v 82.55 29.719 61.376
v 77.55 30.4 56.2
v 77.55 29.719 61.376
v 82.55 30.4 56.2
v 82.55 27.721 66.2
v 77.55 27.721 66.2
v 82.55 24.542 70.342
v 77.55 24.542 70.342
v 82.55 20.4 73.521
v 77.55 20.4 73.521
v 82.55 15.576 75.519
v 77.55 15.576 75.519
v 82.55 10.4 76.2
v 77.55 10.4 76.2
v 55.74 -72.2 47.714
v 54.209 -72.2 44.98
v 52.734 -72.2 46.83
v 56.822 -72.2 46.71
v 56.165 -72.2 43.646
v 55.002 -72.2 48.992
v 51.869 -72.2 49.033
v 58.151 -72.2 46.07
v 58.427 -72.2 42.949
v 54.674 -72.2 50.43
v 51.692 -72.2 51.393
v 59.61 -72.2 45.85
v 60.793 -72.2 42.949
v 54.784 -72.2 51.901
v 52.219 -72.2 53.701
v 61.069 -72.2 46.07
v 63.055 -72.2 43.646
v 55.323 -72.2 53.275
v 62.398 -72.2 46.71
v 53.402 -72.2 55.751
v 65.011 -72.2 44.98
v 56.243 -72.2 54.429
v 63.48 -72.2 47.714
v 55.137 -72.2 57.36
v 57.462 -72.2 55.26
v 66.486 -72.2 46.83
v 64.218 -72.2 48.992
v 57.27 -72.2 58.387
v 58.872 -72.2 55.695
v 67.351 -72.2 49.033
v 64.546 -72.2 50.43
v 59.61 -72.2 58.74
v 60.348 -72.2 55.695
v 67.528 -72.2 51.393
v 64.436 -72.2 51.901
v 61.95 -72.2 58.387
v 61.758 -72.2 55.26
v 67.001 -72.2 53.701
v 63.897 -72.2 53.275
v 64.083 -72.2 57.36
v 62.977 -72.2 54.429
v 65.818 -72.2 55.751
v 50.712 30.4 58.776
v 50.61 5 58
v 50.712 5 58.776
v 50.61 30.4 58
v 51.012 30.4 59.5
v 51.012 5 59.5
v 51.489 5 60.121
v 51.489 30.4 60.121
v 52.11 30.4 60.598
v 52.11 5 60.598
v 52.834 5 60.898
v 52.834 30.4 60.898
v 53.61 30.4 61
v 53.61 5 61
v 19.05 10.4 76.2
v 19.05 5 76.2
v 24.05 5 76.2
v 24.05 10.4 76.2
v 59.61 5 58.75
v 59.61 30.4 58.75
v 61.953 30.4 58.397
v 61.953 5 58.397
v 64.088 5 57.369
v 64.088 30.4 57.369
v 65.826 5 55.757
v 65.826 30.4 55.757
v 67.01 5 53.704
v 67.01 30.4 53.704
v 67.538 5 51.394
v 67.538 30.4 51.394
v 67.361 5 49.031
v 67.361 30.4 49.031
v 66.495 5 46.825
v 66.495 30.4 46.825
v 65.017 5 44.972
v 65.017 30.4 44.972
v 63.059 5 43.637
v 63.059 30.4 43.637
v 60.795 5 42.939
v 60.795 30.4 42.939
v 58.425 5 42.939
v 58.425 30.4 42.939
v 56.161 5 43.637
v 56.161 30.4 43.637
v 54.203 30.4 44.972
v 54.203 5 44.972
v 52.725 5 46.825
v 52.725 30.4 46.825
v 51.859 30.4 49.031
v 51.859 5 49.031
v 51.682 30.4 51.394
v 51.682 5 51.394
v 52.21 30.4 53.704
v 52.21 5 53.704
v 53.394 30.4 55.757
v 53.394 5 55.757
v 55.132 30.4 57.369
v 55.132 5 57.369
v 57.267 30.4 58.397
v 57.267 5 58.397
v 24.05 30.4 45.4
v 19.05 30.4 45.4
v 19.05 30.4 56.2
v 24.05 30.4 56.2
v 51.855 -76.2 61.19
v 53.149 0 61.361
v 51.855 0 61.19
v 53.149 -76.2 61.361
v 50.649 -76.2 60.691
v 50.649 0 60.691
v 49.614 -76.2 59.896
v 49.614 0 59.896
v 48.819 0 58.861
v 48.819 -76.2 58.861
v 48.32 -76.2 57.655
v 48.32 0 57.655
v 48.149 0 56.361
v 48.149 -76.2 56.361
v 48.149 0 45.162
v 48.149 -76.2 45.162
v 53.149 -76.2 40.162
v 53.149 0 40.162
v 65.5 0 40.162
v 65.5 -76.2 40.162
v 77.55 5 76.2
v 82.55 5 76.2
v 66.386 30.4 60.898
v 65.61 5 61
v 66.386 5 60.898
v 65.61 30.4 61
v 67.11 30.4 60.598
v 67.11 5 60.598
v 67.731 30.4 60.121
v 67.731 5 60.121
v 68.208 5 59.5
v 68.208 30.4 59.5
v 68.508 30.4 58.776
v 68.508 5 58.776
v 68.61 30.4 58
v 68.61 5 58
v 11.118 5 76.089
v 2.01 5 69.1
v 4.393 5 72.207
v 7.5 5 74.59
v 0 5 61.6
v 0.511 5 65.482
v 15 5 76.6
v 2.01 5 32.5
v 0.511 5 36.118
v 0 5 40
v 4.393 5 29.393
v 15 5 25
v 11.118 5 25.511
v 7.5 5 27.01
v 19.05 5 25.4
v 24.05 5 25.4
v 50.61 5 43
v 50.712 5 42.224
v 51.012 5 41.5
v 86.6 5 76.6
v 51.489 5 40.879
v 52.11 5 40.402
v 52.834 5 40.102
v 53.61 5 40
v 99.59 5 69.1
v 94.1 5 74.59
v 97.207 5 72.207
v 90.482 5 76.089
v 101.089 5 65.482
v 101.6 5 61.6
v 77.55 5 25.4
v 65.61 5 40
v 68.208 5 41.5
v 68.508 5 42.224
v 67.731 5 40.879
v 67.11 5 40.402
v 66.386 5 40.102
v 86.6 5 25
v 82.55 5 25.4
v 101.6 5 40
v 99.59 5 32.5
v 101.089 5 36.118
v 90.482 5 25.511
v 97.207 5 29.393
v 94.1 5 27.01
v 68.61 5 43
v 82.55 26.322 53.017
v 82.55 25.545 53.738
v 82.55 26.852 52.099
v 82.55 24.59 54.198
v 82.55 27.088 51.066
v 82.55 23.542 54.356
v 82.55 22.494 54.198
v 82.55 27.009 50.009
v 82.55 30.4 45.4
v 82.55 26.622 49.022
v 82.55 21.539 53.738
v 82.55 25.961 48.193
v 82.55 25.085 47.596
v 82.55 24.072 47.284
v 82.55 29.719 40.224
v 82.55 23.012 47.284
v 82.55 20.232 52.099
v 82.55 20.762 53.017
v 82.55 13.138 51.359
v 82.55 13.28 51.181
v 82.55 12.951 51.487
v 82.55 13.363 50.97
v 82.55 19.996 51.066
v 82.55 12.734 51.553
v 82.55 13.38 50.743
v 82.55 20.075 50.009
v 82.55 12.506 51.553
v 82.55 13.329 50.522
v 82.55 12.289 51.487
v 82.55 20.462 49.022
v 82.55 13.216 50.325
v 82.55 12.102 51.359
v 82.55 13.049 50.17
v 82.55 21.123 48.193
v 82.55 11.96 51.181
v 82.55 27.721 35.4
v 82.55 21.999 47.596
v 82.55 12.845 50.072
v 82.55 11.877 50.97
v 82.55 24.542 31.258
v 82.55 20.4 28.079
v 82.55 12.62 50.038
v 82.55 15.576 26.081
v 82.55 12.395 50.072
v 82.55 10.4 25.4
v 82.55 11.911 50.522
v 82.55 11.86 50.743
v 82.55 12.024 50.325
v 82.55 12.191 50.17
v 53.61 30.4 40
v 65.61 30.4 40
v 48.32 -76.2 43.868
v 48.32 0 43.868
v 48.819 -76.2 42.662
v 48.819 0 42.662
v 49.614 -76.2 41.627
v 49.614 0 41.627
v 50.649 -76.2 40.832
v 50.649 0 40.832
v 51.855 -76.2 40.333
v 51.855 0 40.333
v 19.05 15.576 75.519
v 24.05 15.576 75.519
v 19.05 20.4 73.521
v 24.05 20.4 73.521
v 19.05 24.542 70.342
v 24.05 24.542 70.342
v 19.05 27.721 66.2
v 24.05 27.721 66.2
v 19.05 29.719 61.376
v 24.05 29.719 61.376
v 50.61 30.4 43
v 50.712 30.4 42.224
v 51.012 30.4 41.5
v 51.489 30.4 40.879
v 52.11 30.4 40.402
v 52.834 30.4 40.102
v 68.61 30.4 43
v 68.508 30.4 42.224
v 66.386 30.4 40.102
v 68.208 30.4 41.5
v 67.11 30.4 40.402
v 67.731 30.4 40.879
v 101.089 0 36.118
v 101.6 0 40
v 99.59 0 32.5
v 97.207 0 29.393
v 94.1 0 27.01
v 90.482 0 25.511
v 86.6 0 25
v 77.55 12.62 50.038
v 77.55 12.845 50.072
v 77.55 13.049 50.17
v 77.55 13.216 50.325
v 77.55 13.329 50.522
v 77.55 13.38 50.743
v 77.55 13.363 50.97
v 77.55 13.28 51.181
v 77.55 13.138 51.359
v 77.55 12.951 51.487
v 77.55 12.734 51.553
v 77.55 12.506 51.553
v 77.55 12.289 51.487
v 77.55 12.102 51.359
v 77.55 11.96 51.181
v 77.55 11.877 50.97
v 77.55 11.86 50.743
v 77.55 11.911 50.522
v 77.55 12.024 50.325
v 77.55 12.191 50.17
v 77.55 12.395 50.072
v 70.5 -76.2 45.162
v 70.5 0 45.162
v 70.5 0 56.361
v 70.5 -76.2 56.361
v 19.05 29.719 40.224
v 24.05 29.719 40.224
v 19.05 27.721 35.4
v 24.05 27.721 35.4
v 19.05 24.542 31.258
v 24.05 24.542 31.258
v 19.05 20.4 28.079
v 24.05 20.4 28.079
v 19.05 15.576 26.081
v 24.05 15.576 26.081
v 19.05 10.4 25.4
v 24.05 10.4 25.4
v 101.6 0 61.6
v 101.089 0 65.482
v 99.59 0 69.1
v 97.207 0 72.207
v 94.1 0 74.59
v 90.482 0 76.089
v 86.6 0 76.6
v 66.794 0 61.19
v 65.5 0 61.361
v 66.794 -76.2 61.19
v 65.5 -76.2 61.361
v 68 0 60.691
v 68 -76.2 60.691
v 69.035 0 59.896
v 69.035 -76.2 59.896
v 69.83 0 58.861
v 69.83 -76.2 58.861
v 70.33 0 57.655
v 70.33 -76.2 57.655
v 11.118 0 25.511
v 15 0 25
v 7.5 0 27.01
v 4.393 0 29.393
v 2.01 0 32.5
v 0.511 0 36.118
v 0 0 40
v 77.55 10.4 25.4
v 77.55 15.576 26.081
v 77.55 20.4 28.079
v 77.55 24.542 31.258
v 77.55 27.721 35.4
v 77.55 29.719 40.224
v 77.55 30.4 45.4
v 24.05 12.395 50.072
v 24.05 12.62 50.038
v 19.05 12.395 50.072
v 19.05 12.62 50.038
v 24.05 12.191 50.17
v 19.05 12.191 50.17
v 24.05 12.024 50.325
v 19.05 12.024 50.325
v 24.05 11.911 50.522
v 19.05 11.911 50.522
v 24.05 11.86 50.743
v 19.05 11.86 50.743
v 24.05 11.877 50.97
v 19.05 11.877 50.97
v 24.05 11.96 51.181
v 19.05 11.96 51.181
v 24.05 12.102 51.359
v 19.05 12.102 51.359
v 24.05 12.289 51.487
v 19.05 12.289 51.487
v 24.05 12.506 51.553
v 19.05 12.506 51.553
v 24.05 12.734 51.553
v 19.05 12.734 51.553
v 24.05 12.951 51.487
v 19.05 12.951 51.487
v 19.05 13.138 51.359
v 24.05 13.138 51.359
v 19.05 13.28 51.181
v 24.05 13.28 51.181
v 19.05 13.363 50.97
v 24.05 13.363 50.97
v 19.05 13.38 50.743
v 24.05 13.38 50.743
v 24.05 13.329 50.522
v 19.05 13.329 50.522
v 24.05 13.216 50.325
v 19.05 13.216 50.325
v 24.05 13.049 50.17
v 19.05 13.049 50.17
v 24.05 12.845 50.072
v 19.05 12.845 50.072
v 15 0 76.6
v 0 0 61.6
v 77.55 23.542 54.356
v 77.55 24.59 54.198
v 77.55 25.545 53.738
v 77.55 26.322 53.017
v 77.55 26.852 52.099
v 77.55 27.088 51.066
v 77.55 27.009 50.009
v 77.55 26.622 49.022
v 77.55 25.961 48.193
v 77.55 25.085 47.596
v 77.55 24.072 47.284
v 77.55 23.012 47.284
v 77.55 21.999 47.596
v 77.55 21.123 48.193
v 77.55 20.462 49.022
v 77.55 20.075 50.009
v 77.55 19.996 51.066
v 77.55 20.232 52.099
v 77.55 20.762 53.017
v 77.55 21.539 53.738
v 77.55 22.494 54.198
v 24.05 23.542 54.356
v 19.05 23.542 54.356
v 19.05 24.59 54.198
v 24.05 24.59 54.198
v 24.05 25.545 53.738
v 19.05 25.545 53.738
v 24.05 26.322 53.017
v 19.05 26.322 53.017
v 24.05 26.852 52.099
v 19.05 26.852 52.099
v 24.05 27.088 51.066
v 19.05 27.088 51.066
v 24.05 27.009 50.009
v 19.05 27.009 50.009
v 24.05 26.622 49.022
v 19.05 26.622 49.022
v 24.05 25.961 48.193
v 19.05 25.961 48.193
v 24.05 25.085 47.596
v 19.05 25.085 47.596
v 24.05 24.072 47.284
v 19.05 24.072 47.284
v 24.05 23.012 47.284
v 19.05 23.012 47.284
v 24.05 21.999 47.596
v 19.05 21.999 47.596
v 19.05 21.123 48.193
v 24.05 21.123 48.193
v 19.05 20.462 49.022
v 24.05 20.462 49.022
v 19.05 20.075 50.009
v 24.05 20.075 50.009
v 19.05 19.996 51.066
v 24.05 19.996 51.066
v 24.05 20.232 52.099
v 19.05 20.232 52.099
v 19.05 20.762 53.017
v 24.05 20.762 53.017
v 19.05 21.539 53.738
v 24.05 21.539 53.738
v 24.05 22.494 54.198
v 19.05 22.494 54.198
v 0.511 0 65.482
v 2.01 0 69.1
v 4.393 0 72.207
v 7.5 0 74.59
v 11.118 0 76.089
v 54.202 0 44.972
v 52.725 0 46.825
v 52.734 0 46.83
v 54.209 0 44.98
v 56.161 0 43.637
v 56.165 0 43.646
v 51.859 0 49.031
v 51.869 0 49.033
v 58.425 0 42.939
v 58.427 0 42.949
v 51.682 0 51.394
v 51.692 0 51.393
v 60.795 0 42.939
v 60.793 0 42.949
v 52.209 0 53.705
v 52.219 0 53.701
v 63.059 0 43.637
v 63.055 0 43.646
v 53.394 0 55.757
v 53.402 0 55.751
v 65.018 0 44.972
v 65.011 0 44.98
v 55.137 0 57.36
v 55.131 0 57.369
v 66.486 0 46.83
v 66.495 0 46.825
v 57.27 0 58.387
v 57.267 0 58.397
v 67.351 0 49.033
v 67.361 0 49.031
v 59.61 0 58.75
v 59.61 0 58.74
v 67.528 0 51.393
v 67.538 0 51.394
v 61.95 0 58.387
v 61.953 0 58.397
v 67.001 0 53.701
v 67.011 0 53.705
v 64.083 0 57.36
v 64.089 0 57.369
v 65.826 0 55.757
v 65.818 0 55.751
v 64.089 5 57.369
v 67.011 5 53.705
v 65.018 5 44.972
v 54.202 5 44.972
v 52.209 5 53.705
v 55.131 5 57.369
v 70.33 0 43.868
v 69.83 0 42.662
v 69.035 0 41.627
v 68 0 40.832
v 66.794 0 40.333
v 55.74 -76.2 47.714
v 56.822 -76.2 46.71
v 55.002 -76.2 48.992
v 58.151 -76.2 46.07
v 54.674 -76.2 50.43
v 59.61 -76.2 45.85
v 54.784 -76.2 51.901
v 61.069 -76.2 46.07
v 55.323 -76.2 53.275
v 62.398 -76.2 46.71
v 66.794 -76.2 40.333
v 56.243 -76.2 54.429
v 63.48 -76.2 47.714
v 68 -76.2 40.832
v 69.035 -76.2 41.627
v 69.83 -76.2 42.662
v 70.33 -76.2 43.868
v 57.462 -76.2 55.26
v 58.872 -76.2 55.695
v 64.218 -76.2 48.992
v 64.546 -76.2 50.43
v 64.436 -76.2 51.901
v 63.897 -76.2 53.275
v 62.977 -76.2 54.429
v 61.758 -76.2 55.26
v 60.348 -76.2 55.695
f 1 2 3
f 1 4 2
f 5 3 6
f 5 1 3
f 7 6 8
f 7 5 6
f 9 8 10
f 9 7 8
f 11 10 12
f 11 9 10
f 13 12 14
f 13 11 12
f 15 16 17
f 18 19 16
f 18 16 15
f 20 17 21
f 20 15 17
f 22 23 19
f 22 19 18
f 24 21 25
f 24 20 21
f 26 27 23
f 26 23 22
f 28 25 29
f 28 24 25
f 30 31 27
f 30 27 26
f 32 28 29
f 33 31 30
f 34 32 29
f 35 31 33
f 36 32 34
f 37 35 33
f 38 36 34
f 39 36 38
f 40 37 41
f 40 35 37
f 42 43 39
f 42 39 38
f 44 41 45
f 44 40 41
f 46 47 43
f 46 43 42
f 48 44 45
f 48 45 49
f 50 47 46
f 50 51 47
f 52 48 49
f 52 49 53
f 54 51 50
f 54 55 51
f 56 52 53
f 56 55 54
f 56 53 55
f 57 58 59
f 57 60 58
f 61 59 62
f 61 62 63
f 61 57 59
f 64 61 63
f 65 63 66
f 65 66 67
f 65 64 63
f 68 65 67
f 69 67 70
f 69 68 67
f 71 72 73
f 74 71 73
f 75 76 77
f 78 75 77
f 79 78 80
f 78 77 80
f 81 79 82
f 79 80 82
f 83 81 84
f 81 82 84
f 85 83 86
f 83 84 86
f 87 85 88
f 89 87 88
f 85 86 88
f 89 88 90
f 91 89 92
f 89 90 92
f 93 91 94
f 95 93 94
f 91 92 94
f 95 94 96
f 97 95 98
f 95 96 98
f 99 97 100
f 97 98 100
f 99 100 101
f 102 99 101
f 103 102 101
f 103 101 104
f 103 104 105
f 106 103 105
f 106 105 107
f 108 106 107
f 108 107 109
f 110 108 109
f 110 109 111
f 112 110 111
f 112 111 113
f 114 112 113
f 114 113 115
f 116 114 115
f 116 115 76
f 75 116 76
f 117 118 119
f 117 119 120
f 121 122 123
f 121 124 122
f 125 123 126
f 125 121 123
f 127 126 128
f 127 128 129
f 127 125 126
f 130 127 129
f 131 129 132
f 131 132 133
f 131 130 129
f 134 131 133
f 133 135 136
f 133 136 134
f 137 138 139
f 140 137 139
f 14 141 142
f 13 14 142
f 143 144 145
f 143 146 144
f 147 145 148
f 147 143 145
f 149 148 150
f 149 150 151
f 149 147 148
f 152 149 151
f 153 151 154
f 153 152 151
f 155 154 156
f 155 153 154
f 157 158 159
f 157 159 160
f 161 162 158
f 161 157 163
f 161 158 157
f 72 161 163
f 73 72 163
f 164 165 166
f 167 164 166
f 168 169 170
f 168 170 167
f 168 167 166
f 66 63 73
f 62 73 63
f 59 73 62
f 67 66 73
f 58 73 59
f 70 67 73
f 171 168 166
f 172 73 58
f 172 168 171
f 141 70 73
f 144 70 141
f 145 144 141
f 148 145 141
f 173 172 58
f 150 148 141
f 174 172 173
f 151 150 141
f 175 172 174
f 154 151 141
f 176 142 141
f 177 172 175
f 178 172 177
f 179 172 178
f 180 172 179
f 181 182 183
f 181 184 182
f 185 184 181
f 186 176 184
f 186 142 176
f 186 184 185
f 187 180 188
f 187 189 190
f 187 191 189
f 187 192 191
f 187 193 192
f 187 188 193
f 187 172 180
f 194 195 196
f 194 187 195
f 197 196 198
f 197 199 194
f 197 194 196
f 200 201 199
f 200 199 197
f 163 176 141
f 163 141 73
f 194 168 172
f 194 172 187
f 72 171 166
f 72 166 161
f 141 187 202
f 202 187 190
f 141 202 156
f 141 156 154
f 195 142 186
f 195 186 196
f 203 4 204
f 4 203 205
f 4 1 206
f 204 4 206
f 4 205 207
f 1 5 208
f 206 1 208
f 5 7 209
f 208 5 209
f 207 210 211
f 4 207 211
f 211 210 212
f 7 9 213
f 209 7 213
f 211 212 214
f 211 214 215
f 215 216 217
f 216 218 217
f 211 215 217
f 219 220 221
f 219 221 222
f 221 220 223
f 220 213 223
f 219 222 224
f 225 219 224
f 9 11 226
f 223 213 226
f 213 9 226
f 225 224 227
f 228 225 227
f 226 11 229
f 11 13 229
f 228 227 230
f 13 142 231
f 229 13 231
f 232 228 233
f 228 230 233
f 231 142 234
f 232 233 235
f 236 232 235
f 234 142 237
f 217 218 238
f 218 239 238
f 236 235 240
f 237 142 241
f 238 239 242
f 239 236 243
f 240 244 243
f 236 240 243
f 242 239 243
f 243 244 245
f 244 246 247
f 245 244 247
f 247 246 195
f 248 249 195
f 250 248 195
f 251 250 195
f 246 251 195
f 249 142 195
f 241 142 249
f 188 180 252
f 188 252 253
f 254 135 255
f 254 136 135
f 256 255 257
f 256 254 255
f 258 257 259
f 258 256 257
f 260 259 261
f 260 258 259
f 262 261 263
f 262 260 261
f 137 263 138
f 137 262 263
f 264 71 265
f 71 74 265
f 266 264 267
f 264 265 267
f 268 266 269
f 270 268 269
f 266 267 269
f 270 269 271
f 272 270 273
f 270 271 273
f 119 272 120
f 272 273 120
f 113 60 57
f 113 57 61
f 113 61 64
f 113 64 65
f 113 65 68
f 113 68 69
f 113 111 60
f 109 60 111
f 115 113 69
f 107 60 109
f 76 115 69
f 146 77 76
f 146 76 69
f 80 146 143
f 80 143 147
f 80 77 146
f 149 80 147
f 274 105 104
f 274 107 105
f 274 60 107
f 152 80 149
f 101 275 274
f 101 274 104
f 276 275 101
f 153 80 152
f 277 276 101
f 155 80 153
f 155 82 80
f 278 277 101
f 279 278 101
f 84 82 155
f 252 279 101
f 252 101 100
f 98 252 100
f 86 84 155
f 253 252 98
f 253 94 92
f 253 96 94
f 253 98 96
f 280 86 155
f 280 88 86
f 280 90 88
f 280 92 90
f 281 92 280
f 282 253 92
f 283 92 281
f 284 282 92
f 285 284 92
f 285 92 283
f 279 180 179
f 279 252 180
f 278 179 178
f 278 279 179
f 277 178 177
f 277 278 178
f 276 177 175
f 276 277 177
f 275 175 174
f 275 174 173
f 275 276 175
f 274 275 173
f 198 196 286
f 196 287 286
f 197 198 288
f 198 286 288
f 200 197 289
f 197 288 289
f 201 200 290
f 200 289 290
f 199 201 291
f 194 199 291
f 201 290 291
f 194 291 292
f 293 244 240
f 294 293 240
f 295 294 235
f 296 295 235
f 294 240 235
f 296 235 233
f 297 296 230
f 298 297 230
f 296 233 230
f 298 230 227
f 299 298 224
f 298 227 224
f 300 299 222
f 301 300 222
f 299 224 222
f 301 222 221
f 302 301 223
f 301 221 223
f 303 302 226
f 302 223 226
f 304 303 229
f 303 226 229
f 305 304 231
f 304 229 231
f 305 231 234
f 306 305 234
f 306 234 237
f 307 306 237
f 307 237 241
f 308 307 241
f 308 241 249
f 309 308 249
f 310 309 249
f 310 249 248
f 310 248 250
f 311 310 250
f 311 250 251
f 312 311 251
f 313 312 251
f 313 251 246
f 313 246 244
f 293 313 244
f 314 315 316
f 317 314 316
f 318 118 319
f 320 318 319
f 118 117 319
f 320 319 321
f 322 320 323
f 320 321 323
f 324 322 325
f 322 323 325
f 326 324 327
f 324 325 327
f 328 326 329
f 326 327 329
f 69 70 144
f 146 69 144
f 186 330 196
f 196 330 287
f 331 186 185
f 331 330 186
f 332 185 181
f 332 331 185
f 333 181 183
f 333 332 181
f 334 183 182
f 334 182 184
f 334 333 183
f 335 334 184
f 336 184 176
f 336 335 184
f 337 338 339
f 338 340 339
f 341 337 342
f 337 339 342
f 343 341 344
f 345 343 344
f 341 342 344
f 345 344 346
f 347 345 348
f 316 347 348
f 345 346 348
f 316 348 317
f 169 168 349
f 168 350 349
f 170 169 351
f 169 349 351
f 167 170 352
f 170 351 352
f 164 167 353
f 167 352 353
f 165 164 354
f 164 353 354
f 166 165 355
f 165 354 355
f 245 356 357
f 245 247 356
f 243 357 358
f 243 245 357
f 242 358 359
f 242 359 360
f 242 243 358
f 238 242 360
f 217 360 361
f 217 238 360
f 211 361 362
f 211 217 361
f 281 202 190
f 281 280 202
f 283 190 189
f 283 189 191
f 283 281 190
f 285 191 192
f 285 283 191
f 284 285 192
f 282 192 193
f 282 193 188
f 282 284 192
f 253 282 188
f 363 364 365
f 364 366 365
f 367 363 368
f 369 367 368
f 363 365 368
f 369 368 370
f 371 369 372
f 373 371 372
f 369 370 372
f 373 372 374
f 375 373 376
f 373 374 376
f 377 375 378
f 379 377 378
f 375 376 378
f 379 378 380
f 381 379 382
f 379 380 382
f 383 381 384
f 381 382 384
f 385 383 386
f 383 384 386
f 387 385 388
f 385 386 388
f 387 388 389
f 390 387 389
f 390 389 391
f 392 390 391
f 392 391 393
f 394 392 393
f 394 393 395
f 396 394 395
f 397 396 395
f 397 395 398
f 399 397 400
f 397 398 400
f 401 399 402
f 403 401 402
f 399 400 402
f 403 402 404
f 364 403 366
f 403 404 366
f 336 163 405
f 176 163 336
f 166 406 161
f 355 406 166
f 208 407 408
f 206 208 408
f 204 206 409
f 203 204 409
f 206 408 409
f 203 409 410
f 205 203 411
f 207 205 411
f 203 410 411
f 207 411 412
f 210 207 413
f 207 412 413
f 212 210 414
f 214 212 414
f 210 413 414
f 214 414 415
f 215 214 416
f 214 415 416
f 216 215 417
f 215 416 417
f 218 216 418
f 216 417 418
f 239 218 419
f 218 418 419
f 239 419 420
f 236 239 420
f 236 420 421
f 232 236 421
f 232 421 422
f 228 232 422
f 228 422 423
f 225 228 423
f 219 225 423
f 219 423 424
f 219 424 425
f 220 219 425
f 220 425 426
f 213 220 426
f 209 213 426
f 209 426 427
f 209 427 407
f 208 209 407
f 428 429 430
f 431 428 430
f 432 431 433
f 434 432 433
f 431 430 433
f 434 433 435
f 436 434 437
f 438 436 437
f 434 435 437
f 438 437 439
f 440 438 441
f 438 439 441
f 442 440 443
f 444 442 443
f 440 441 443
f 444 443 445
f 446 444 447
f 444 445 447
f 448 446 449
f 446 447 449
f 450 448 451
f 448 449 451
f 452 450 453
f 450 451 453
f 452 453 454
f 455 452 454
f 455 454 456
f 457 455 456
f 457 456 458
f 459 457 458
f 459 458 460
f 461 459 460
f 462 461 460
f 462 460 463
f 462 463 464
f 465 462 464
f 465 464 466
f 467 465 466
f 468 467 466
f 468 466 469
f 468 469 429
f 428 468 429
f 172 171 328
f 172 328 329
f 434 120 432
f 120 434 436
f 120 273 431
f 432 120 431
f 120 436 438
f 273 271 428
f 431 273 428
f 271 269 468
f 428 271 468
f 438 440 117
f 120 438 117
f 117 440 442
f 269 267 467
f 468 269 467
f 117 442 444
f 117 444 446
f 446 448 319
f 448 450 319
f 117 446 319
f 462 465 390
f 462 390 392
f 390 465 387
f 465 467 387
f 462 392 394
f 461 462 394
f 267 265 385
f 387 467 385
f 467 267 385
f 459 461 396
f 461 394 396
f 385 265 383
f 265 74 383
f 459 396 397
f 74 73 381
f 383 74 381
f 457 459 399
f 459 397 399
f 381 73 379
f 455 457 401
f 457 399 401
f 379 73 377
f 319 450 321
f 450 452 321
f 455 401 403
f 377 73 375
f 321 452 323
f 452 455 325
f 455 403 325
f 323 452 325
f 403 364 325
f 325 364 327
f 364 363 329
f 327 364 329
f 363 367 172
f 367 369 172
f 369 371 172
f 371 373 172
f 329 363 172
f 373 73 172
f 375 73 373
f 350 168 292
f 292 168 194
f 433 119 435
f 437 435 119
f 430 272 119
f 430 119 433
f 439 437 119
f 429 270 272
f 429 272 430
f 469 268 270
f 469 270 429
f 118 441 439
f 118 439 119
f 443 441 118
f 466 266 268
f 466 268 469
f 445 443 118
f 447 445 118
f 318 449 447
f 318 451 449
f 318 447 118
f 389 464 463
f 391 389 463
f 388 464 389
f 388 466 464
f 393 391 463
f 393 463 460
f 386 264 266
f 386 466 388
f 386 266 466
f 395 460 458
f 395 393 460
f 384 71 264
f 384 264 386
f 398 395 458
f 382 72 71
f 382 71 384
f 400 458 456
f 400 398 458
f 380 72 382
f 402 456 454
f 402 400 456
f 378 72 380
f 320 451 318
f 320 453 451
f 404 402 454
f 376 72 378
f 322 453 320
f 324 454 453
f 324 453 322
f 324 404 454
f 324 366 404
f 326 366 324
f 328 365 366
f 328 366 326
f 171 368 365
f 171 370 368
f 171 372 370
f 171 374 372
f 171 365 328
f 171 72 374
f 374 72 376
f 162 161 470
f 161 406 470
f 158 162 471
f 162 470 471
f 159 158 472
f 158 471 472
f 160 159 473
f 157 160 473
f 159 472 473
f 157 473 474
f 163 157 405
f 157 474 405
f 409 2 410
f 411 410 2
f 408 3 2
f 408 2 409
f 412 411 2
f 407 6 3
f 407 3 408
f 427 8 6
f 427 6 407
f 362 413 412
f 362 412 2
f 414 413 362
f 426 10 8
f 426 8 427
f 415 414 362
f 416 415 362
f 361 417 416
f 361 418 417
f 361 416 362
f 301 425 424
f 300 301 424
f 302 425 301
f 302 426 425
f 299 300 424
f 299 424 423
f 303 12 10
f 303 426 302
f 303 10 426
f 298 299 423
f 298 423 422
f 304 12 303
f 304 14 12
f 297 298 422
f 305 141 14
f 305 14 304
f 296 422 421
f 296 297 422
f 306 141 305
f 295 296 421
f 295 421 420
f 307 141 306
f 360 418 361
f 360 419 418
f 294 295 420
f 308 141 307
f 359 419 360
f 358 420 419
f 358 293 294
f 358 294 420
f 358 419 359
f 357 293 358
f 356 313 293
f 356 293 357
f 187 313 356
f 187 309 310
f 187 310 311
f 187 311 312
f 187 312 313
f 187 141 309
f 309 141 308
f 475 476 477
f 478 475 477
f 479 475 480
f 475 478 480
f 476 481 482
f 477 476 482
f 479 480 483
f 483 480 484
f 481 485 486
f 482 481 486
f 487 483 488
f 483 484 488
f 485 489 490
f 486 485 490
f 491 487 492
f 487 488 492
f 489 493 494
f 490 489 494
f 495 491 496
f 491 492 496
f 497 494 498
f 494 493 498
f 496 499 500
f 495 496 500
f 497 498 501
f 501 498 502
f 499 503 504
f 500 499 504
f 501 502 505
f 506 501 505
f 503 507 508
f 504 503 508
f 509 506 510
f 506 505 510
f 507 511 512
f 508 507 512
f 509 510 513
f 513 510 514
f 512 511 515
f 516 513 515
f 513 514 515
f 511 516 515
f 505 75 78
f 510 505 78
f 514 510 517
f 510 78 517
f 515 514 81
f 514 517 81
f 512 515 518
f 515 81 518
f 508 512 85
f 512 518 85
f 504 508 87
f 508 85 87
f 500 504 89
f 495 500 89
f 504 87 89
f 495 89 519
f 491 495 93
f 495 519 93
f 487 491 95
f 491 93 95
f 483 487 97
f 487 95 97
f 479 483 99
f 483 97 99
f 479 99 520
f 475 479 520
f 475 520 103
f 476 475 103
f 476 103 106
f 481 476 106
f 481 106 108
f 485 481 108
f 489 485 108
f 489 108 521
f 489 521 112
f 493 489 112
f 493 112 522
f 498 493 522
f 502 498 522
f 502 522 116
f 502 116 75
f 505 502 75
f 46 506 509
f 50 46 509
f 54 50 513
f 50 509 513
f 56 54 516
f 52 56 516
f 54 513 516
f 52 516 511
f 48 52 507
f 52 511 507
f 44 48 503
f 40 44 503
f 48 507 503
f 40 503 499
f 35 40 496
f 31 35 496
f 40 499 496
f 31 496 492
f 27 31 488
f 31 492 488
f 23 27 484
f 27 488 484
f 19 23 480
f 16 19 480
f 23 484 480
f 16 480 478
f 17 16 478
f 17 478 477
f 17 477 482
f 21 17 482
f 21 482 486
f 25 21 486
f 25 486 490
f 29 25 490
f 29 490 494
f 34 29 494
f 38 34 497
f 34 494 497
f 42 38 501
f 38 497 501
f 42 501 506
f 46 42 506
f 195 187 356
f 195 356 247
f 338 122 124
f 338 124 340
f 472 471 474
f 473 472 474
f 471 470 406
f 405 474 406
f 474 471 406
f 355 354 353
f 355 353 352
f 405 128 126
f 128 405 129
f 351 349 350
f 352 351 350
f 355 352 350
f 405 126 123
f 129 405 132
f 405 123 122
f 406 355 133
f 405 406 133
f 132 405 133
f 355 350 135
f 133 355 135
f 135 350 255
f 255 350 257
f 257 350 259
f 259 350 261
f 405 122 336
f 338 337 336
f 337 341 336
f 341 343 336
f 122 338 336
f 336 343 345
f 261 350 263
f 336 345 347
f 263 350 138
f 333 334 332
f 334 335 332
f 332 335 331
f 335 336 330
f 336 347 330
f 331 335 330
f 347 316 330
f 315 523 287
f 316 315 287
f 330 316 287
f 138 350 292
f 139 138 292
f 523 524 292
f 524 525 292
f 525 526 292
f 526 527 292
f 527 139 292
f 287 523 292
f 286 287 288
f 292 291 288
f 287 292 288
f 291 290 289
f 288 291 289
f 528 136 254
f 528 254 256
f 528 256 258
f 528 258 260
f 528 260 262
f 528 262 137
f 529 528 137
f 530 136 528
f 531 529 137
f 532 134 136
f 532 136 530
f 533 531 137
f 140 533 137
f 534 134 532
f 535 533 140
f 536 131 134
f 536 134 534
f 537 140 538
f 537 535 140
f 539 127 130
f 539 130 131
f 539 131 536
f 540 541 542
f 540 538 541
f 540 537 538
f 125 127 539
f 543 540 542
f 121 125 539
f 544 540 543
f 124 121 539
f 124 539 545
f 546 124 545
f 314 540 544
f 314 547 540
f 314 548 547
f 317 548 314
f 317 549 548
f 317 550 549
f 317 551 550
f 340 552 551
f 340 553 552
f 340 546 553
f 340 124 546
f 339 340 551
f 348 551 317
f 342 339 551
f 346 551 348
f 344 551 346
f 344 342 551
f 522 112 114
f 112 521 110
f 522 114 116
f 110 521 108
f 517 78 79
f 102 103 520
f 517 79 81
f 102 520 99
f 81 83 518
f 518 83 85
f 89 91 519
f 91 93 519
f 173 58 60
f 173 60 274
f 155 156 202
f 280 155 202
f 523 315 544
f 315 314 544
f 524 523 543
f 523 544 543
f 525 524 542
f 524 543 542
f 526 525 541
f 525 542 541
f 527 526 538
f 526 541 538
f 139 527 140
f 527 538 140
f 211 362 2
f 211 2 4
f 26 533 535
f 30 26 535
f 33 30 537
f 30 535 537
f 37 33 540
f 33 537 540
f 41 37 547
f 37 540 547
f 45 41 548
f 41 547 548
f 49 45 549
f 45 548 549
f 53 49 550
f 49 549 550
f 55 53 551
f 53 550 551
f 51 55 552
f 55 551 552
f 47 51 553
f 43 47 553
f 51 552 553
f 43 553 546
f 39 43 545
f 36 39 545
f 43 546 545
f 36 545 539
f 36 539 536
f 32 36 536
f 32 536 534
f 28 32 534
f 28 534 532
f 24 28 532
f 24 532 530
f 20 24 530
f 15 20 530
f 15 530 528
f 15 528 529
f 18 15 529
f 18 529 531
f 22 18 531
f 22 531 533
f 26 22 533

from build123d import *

# Parameters (mm, degrees)
SKETCH2_W           = 101.6
SKETCH2_H           = 101.6
BOSS_EXTRUDE2_DEPTH = 5
SKETCH3_W           = 5
SKETCH3_H           = 50.8
BOSS_EXTRUDE3_DEPTH = 25.4
SKETCH4_W           = 5
SKETCH4_H           = 50.8
BOSS_EXTRUDE4_DEPTH = 25.4
SKETCH8_R           = 3.556
CUT_EXTRUDE1_DEPTH  = 135.392047756
CUT_EXTRUDE2_REACH  = 136.392
SKETCH9_R           = 0.762
SKETCH11_R          = 7.9502
CUT_EXTRUDE3_DEPTH  = 146.911891222
CUT_EXTRUDE5_REACH  = 136.392
SKETCH18_R          = 0.762
SKETCH19_W          = 22.350467385
SKETCH19_H          = 21.198381437
BOSS_EXTRUDE5_DEPTH = 76.2
SKETCH22_R          = 7.94
CUT_EXTRUDE7_DEPTH  = 72.2
SKETCH23_R          = 4.95
CUT_EXTRUDE8_DEPTH  = 179.909697893
SKETCH24_W          = 101.6
SKETCH24_H          = 25
CUT_EXTRUDE9_DEPTH  = 166.041085794
SKETCH25_W          = 101.6
SKETCH25_H          = 25
CUT_EXTRUDE10_DEPTH = 166.041085794
FILLET1_R           = 20
FILLET2_R           = 20
FILLET3_R           = 20
FILLET4_R           = 20
FILLET5_R           = 15
FILLET6_R           = 15
FILLET7_R           = 15
FILLET8_R           = 15
FILLET9_R           = 5
FILLET10_R          = 5
FILLET11_R          = 5
FILLET12_R          = 5
SKETCH35_W          = 18
SKETCH35_H          = 21
BOSS_EXTRUDE7_DEPTH = 25.4
CUT_EXTRUDE12_REACH = 167.993
SKETCH36_R          = 7.95
FILLET18_R          = 3
FILLET19_R          = 3
FILLET20_R          = 3
FILLET21_R          = 3


with BuildPart() as part:
    # Sketch2 → Boss-Extrude2 (new body)
    with BuildSketch(Plane(origin=(0, 0, 0), x_dir=(1, 0, 0), z_dir=(0, 1, 0))):
        with Locations((50.8, -50.8)):
            Rectangle(SKETCH2_W, SKETCH2_H)
    extrude(amount=BOSS_EXTRUDE2_DEPTH)

    # Sketch3 → Boss-Extrude3 (add)
    with BuildSketch(Plane(origin=(0, 5, 0), x_dir=(1, 0, 0), z_dir=(0, 1, 0))):
        with Locations((21.55, -50.8)):
            Rectangle(SKETCH3_W, SKETCH3_H)
    extrude(amount=BOSS_EXTRUDE3_DEPTH)

    # Sketch4 → Boss-Extrude4 (add)
    with BuildSketch(Plane(origin=(0, 5, 0), x_dir=(1, 0, 0), z_dir=(0, 1, 0))):
        with Locations((80.05, -50.8)):
            Rectangle(SKETCH4_W, SKETCH4_H)
    extrude(amount=BOSS_EXTRUDE4_DEPTH)

    # Sketch8 → Cut-Extrude1 (cut, through all)
    with BuildSketch(Plane.ZY.offset(-19.05)):
        with Locations((50.8, 23.542)):
            Circle(SKETCH8_R)
    extrude(amount=-CUT_EXTRUDE1_DEPTH, mode=Mode.SUBTRACT)

    # Sketch9 → Cut-Extrude2 (cut, up to next)
    with BuildSketch(Plane(origin=(82.55, 0, 0), x_dir=(0, 0, -1), z_dir=(1, 0, 0)), mode=Mode.PRIVATE) as cut_extrude2_sk1:
        with Locations((-50.8, 12.62)):
            Circle(SKETCH9_R)
    cut_extrude2_tool1 = extrude(cut_extrude2_sk1.sketch, amount=-CUT_EXTRUDE2_REACH, mode=Mode.PRIVATE) & part.part
    add(cut_extrude2_tool1.solids().sort_by_distance((82.55, 12.62, 50.8))[0], mode=Mode.SUBTRACT)

    # Sketch11 → Cut-Extrude3 (cut, through all)
    with BuildSketch(Plane(origin=(0, 5, 0), x_dir=(1, 0, 0), z_dir=(0, 1, 0))):
        with Locations(Location((59.61, -50.8, 0), (0, 0, 270))):
            Circle(SKETCH11_R)
    extrude(amount=-CUT_EXTRUDE3_DEPTH, mode=Mode.SUBTRACT)

    # Sketch18 → Cut-Extrude5 (cut, up to next)
    with BuildSketch(Plane.ZY.offset(-19.05), mode=Mode.PRIVATE) as cut_extrude5_sk1:
        with Locations(Location((50.8, 12.62, 0), (0, 0, 180))):
            Circle(SKETCH18_R)
    cut_extrude5_tool1 = extrude(cut_extrude5_sk1.sketch, amount=-CUT_EXTRUDE5_REACH, mode=Mode.PRIVATE) & part.part
    add(cut_extrude5_tool1.solids().sort_by_distance((19.05, 12.62, 50.8))[0], mode=Mode.SUBTRACT)

    # Sketch19 → Boss-Extrude5 (add)
    with BuildSketch(Plane.XZ):
        with Locations((59.324658632, 50.761526183)):
            Rectangle(SKETCH19_W, SKETCH19_H)
    extrude(amount=BOSS_EXTRUDE5_DEPTH)

    # Sketch22 → Cut-Extrude7 (cut)
    with BuildSketch(Plane(origin=(0, 0, 0), x_dir=(1, 0, 0), z_dir=(0, 1, 0))):
        with Locations(Location((59.61, -50.8, 0), (0, 0, 270))):
            Circle(SKETCH22_R)
    extrude(amount=-CUT_EXTRUDE7_DEPTH, mode=Mode.SUBTRACT)

    # Sketch23 → Cut-Extrude8 (cut, through all)
    with BuildSketch(Plane.XZ.offset(76.2)):
        with Locations(Location((59.61, 50.8, 0), (0, 0, 270))):
            Circle(SKETCH23_R)
    extrude(amount=-CUT_EXTRUDE8_DEPTH, mode=Mode.SUBTRACT)

    # Sketch24 → Cut-Extrude9 (cut, through all)
    with BuildSketch(Plane(origin=(0, 5, 0), x_dir=(1, 0, 0), z_dir=(0, 1, 0))):
        with Locations((50.8, -12.5)):
            Rectangle(SKETCH24_W, SKETCH24_H)
    extrude(amount=-CUT_EXTRUDE9_DEPTH, mode=Mode.SUBTRACT)

    # Sketch25 → Cut-Extrude10 (cut, through all)
    with BuildSketch(Plane(origin=(0, 5, 0), x_dir=(1, 0, 0), z_dir=(0, 1, 0))):
        with Locations((50.8, -89.1)):
            Rectangle(SKETCH25_W, SKETCH25_H)
    extrude(amount=-CUT_EXTRUDE10_DEPTH, mode=Mode.SUBTRACT)

    # Fillet1
    fillet1_edges = [part.edges().sort_by_distance(p)[0] for p in [
        (21.55, 30.4, 76.2),
    ]]
    fillet(fillet1_edges, radius=FILLET1_R)

    # Fillet2
    fillet2_edges = [part.edges().sort_by_distance(p)[0] for p in [
        (21.55, 30.4, 25.4),
    ]]
    fillet(fillet2_edges, radius=FILLET2_R)

    # Fillet3
    fillet3_edges = [part.edges().sort_by_distance(p)[0] for p in [
        (80.05, 30.4, 25.4),
    ]]
    fillet(fillet3_edges, radius=FILLET3_R)

    # Fillet4
    fillet4_edges = [part.edges().sort_by_distance(p)[0] for p in [
        (80.05, 30.4, 76.2),
    ]]
    fillet(fillet4_edges, radius=FILLET4_R)

    # Fillet5
    fillet5_edges = [part.edges().sort_by_distance(p)[0] for p in [
        (101.6, 2.5, 76.6),
    ]]
    fillet(fillet5_edges, radius=FILLET5_R)

    # Fillet6
    fillet6_edges = [part.edges().sort_by_distance(p)[0] for p in [
        (101.6, 2.5, 25),
    ]]
    fillet(fillet6_edges, radius=FILLET6_R)

    # Fillet7
    fillet7_edges = [part.edges().sort_by_distance(p)[0] for p in [
        (0, 2.5, 25),
    ]]
    fillet(fillet7_edges, radius=FILLET7_R)

    # Fillet8
    fillet8_edges = [part.edges().sort_by_distance(p)[0] for p in [
        (0, 2.5, 76.6),
    ]]
    fillet(fillet8_edges, radius=FILLET8_R)

    # Fillet9
    fillet9_edges = [part.edges().sort_by_distance(p)[0] for p in [
        (70.499892324, -38.1, 61.360716901),
    ]]
    fillet(fillet9_edges, radius=FILLET9_R)

    # Fillet10
    fillet10_edges = [part.edges().sort_by_distance(p)[0] for p in [
        (70.499892324, -38.1, 40.162335464),
    ]]
    fillet(fillet10_edges, radius=FILLET10_R)

    # Fillet11
    fillet11_edges = [part.edges().sort_by_distance(p)[0] for p in [
        (48.149424939, -38.1, 61.360716901),
    ]]
    fillet(fillet11_edges, radius=FILLET11_R)

    # Fillet12
    fillet12_edges = [part.edges().sort_by_distance(p)[0] for p in [
        (48.149424939, -38.1, 40.162335464),
    ]]
    fillet(fillet12_edges, radius=FILLET12_R)

    # Sketch35 → Boss-Extrude7 (add)
    with BuildSketch(Plane(origin=(0, 5, 0), x_dir=(1, 0, 0), z_dir=(0, 1, 0))):
        with Locations((59.61, -50.5)):
            Rectangle(SKETCH35_W, SKETCH35_H)
    extrude(amount=BOSS_EXTRUDE7_DEPTH)

    # Sketch36 → Cut-Extrude12 (cut, up to next)
    with BuildSketch(Plane(origin=(0, 30.4, 0), x_dir=(1, 0, 0), z_dir=(0, 1, 0)), mode=Mode.PRIVATE) as cut_extrude12_sk1:
        with Locations(Location((59.61, -50.8, 0), (0, 0, 270))):
            Circle(SKETCH36_R)
    cut_extrude12_tool1 = extrude(cut_extrude12_sk1.sketch, amount=-CUT_EXTRUDE12_REACH, mode=Mode.PRIVATE) & part.part
    add(cut_extrude12_tool1.solids().sort_by_distance((59.61, 30.4, 50.8))[0], mode=Mode.SUBTRACT)

    # Fillet18
    fillet18_edges = [part.edges().sort_by_distance(p)[0] for p in [
        (50.61, 17.7, 61),
    ]]
    fillet(fillet18_edges, radius=FILLET18_R)

    # Fillet19
    fillet19_edges = [part.edges().sort_by_distance(p)[0] for p in [
        (68.61, 17.7, 61),
    ]]
    fillet(fillet19_edges, radius=FILLET19_R)

    # Fillet20
    fillet20_edges = [part.edges().sort_by_distance(p)[0] for p in [
        (68.61, 17.7, 40),
    ]]
    fillet(fillet20_edges, radius=FILLET20_R)

    # Fillet21
    fillet21_edges = [part.edges().sort_by_distance(p)[0] for p in [
        (50.61, 17.7, 40),
    ]]
    fillet(fillet21_edges, radius=FILLET21_R)


solid = part.part
